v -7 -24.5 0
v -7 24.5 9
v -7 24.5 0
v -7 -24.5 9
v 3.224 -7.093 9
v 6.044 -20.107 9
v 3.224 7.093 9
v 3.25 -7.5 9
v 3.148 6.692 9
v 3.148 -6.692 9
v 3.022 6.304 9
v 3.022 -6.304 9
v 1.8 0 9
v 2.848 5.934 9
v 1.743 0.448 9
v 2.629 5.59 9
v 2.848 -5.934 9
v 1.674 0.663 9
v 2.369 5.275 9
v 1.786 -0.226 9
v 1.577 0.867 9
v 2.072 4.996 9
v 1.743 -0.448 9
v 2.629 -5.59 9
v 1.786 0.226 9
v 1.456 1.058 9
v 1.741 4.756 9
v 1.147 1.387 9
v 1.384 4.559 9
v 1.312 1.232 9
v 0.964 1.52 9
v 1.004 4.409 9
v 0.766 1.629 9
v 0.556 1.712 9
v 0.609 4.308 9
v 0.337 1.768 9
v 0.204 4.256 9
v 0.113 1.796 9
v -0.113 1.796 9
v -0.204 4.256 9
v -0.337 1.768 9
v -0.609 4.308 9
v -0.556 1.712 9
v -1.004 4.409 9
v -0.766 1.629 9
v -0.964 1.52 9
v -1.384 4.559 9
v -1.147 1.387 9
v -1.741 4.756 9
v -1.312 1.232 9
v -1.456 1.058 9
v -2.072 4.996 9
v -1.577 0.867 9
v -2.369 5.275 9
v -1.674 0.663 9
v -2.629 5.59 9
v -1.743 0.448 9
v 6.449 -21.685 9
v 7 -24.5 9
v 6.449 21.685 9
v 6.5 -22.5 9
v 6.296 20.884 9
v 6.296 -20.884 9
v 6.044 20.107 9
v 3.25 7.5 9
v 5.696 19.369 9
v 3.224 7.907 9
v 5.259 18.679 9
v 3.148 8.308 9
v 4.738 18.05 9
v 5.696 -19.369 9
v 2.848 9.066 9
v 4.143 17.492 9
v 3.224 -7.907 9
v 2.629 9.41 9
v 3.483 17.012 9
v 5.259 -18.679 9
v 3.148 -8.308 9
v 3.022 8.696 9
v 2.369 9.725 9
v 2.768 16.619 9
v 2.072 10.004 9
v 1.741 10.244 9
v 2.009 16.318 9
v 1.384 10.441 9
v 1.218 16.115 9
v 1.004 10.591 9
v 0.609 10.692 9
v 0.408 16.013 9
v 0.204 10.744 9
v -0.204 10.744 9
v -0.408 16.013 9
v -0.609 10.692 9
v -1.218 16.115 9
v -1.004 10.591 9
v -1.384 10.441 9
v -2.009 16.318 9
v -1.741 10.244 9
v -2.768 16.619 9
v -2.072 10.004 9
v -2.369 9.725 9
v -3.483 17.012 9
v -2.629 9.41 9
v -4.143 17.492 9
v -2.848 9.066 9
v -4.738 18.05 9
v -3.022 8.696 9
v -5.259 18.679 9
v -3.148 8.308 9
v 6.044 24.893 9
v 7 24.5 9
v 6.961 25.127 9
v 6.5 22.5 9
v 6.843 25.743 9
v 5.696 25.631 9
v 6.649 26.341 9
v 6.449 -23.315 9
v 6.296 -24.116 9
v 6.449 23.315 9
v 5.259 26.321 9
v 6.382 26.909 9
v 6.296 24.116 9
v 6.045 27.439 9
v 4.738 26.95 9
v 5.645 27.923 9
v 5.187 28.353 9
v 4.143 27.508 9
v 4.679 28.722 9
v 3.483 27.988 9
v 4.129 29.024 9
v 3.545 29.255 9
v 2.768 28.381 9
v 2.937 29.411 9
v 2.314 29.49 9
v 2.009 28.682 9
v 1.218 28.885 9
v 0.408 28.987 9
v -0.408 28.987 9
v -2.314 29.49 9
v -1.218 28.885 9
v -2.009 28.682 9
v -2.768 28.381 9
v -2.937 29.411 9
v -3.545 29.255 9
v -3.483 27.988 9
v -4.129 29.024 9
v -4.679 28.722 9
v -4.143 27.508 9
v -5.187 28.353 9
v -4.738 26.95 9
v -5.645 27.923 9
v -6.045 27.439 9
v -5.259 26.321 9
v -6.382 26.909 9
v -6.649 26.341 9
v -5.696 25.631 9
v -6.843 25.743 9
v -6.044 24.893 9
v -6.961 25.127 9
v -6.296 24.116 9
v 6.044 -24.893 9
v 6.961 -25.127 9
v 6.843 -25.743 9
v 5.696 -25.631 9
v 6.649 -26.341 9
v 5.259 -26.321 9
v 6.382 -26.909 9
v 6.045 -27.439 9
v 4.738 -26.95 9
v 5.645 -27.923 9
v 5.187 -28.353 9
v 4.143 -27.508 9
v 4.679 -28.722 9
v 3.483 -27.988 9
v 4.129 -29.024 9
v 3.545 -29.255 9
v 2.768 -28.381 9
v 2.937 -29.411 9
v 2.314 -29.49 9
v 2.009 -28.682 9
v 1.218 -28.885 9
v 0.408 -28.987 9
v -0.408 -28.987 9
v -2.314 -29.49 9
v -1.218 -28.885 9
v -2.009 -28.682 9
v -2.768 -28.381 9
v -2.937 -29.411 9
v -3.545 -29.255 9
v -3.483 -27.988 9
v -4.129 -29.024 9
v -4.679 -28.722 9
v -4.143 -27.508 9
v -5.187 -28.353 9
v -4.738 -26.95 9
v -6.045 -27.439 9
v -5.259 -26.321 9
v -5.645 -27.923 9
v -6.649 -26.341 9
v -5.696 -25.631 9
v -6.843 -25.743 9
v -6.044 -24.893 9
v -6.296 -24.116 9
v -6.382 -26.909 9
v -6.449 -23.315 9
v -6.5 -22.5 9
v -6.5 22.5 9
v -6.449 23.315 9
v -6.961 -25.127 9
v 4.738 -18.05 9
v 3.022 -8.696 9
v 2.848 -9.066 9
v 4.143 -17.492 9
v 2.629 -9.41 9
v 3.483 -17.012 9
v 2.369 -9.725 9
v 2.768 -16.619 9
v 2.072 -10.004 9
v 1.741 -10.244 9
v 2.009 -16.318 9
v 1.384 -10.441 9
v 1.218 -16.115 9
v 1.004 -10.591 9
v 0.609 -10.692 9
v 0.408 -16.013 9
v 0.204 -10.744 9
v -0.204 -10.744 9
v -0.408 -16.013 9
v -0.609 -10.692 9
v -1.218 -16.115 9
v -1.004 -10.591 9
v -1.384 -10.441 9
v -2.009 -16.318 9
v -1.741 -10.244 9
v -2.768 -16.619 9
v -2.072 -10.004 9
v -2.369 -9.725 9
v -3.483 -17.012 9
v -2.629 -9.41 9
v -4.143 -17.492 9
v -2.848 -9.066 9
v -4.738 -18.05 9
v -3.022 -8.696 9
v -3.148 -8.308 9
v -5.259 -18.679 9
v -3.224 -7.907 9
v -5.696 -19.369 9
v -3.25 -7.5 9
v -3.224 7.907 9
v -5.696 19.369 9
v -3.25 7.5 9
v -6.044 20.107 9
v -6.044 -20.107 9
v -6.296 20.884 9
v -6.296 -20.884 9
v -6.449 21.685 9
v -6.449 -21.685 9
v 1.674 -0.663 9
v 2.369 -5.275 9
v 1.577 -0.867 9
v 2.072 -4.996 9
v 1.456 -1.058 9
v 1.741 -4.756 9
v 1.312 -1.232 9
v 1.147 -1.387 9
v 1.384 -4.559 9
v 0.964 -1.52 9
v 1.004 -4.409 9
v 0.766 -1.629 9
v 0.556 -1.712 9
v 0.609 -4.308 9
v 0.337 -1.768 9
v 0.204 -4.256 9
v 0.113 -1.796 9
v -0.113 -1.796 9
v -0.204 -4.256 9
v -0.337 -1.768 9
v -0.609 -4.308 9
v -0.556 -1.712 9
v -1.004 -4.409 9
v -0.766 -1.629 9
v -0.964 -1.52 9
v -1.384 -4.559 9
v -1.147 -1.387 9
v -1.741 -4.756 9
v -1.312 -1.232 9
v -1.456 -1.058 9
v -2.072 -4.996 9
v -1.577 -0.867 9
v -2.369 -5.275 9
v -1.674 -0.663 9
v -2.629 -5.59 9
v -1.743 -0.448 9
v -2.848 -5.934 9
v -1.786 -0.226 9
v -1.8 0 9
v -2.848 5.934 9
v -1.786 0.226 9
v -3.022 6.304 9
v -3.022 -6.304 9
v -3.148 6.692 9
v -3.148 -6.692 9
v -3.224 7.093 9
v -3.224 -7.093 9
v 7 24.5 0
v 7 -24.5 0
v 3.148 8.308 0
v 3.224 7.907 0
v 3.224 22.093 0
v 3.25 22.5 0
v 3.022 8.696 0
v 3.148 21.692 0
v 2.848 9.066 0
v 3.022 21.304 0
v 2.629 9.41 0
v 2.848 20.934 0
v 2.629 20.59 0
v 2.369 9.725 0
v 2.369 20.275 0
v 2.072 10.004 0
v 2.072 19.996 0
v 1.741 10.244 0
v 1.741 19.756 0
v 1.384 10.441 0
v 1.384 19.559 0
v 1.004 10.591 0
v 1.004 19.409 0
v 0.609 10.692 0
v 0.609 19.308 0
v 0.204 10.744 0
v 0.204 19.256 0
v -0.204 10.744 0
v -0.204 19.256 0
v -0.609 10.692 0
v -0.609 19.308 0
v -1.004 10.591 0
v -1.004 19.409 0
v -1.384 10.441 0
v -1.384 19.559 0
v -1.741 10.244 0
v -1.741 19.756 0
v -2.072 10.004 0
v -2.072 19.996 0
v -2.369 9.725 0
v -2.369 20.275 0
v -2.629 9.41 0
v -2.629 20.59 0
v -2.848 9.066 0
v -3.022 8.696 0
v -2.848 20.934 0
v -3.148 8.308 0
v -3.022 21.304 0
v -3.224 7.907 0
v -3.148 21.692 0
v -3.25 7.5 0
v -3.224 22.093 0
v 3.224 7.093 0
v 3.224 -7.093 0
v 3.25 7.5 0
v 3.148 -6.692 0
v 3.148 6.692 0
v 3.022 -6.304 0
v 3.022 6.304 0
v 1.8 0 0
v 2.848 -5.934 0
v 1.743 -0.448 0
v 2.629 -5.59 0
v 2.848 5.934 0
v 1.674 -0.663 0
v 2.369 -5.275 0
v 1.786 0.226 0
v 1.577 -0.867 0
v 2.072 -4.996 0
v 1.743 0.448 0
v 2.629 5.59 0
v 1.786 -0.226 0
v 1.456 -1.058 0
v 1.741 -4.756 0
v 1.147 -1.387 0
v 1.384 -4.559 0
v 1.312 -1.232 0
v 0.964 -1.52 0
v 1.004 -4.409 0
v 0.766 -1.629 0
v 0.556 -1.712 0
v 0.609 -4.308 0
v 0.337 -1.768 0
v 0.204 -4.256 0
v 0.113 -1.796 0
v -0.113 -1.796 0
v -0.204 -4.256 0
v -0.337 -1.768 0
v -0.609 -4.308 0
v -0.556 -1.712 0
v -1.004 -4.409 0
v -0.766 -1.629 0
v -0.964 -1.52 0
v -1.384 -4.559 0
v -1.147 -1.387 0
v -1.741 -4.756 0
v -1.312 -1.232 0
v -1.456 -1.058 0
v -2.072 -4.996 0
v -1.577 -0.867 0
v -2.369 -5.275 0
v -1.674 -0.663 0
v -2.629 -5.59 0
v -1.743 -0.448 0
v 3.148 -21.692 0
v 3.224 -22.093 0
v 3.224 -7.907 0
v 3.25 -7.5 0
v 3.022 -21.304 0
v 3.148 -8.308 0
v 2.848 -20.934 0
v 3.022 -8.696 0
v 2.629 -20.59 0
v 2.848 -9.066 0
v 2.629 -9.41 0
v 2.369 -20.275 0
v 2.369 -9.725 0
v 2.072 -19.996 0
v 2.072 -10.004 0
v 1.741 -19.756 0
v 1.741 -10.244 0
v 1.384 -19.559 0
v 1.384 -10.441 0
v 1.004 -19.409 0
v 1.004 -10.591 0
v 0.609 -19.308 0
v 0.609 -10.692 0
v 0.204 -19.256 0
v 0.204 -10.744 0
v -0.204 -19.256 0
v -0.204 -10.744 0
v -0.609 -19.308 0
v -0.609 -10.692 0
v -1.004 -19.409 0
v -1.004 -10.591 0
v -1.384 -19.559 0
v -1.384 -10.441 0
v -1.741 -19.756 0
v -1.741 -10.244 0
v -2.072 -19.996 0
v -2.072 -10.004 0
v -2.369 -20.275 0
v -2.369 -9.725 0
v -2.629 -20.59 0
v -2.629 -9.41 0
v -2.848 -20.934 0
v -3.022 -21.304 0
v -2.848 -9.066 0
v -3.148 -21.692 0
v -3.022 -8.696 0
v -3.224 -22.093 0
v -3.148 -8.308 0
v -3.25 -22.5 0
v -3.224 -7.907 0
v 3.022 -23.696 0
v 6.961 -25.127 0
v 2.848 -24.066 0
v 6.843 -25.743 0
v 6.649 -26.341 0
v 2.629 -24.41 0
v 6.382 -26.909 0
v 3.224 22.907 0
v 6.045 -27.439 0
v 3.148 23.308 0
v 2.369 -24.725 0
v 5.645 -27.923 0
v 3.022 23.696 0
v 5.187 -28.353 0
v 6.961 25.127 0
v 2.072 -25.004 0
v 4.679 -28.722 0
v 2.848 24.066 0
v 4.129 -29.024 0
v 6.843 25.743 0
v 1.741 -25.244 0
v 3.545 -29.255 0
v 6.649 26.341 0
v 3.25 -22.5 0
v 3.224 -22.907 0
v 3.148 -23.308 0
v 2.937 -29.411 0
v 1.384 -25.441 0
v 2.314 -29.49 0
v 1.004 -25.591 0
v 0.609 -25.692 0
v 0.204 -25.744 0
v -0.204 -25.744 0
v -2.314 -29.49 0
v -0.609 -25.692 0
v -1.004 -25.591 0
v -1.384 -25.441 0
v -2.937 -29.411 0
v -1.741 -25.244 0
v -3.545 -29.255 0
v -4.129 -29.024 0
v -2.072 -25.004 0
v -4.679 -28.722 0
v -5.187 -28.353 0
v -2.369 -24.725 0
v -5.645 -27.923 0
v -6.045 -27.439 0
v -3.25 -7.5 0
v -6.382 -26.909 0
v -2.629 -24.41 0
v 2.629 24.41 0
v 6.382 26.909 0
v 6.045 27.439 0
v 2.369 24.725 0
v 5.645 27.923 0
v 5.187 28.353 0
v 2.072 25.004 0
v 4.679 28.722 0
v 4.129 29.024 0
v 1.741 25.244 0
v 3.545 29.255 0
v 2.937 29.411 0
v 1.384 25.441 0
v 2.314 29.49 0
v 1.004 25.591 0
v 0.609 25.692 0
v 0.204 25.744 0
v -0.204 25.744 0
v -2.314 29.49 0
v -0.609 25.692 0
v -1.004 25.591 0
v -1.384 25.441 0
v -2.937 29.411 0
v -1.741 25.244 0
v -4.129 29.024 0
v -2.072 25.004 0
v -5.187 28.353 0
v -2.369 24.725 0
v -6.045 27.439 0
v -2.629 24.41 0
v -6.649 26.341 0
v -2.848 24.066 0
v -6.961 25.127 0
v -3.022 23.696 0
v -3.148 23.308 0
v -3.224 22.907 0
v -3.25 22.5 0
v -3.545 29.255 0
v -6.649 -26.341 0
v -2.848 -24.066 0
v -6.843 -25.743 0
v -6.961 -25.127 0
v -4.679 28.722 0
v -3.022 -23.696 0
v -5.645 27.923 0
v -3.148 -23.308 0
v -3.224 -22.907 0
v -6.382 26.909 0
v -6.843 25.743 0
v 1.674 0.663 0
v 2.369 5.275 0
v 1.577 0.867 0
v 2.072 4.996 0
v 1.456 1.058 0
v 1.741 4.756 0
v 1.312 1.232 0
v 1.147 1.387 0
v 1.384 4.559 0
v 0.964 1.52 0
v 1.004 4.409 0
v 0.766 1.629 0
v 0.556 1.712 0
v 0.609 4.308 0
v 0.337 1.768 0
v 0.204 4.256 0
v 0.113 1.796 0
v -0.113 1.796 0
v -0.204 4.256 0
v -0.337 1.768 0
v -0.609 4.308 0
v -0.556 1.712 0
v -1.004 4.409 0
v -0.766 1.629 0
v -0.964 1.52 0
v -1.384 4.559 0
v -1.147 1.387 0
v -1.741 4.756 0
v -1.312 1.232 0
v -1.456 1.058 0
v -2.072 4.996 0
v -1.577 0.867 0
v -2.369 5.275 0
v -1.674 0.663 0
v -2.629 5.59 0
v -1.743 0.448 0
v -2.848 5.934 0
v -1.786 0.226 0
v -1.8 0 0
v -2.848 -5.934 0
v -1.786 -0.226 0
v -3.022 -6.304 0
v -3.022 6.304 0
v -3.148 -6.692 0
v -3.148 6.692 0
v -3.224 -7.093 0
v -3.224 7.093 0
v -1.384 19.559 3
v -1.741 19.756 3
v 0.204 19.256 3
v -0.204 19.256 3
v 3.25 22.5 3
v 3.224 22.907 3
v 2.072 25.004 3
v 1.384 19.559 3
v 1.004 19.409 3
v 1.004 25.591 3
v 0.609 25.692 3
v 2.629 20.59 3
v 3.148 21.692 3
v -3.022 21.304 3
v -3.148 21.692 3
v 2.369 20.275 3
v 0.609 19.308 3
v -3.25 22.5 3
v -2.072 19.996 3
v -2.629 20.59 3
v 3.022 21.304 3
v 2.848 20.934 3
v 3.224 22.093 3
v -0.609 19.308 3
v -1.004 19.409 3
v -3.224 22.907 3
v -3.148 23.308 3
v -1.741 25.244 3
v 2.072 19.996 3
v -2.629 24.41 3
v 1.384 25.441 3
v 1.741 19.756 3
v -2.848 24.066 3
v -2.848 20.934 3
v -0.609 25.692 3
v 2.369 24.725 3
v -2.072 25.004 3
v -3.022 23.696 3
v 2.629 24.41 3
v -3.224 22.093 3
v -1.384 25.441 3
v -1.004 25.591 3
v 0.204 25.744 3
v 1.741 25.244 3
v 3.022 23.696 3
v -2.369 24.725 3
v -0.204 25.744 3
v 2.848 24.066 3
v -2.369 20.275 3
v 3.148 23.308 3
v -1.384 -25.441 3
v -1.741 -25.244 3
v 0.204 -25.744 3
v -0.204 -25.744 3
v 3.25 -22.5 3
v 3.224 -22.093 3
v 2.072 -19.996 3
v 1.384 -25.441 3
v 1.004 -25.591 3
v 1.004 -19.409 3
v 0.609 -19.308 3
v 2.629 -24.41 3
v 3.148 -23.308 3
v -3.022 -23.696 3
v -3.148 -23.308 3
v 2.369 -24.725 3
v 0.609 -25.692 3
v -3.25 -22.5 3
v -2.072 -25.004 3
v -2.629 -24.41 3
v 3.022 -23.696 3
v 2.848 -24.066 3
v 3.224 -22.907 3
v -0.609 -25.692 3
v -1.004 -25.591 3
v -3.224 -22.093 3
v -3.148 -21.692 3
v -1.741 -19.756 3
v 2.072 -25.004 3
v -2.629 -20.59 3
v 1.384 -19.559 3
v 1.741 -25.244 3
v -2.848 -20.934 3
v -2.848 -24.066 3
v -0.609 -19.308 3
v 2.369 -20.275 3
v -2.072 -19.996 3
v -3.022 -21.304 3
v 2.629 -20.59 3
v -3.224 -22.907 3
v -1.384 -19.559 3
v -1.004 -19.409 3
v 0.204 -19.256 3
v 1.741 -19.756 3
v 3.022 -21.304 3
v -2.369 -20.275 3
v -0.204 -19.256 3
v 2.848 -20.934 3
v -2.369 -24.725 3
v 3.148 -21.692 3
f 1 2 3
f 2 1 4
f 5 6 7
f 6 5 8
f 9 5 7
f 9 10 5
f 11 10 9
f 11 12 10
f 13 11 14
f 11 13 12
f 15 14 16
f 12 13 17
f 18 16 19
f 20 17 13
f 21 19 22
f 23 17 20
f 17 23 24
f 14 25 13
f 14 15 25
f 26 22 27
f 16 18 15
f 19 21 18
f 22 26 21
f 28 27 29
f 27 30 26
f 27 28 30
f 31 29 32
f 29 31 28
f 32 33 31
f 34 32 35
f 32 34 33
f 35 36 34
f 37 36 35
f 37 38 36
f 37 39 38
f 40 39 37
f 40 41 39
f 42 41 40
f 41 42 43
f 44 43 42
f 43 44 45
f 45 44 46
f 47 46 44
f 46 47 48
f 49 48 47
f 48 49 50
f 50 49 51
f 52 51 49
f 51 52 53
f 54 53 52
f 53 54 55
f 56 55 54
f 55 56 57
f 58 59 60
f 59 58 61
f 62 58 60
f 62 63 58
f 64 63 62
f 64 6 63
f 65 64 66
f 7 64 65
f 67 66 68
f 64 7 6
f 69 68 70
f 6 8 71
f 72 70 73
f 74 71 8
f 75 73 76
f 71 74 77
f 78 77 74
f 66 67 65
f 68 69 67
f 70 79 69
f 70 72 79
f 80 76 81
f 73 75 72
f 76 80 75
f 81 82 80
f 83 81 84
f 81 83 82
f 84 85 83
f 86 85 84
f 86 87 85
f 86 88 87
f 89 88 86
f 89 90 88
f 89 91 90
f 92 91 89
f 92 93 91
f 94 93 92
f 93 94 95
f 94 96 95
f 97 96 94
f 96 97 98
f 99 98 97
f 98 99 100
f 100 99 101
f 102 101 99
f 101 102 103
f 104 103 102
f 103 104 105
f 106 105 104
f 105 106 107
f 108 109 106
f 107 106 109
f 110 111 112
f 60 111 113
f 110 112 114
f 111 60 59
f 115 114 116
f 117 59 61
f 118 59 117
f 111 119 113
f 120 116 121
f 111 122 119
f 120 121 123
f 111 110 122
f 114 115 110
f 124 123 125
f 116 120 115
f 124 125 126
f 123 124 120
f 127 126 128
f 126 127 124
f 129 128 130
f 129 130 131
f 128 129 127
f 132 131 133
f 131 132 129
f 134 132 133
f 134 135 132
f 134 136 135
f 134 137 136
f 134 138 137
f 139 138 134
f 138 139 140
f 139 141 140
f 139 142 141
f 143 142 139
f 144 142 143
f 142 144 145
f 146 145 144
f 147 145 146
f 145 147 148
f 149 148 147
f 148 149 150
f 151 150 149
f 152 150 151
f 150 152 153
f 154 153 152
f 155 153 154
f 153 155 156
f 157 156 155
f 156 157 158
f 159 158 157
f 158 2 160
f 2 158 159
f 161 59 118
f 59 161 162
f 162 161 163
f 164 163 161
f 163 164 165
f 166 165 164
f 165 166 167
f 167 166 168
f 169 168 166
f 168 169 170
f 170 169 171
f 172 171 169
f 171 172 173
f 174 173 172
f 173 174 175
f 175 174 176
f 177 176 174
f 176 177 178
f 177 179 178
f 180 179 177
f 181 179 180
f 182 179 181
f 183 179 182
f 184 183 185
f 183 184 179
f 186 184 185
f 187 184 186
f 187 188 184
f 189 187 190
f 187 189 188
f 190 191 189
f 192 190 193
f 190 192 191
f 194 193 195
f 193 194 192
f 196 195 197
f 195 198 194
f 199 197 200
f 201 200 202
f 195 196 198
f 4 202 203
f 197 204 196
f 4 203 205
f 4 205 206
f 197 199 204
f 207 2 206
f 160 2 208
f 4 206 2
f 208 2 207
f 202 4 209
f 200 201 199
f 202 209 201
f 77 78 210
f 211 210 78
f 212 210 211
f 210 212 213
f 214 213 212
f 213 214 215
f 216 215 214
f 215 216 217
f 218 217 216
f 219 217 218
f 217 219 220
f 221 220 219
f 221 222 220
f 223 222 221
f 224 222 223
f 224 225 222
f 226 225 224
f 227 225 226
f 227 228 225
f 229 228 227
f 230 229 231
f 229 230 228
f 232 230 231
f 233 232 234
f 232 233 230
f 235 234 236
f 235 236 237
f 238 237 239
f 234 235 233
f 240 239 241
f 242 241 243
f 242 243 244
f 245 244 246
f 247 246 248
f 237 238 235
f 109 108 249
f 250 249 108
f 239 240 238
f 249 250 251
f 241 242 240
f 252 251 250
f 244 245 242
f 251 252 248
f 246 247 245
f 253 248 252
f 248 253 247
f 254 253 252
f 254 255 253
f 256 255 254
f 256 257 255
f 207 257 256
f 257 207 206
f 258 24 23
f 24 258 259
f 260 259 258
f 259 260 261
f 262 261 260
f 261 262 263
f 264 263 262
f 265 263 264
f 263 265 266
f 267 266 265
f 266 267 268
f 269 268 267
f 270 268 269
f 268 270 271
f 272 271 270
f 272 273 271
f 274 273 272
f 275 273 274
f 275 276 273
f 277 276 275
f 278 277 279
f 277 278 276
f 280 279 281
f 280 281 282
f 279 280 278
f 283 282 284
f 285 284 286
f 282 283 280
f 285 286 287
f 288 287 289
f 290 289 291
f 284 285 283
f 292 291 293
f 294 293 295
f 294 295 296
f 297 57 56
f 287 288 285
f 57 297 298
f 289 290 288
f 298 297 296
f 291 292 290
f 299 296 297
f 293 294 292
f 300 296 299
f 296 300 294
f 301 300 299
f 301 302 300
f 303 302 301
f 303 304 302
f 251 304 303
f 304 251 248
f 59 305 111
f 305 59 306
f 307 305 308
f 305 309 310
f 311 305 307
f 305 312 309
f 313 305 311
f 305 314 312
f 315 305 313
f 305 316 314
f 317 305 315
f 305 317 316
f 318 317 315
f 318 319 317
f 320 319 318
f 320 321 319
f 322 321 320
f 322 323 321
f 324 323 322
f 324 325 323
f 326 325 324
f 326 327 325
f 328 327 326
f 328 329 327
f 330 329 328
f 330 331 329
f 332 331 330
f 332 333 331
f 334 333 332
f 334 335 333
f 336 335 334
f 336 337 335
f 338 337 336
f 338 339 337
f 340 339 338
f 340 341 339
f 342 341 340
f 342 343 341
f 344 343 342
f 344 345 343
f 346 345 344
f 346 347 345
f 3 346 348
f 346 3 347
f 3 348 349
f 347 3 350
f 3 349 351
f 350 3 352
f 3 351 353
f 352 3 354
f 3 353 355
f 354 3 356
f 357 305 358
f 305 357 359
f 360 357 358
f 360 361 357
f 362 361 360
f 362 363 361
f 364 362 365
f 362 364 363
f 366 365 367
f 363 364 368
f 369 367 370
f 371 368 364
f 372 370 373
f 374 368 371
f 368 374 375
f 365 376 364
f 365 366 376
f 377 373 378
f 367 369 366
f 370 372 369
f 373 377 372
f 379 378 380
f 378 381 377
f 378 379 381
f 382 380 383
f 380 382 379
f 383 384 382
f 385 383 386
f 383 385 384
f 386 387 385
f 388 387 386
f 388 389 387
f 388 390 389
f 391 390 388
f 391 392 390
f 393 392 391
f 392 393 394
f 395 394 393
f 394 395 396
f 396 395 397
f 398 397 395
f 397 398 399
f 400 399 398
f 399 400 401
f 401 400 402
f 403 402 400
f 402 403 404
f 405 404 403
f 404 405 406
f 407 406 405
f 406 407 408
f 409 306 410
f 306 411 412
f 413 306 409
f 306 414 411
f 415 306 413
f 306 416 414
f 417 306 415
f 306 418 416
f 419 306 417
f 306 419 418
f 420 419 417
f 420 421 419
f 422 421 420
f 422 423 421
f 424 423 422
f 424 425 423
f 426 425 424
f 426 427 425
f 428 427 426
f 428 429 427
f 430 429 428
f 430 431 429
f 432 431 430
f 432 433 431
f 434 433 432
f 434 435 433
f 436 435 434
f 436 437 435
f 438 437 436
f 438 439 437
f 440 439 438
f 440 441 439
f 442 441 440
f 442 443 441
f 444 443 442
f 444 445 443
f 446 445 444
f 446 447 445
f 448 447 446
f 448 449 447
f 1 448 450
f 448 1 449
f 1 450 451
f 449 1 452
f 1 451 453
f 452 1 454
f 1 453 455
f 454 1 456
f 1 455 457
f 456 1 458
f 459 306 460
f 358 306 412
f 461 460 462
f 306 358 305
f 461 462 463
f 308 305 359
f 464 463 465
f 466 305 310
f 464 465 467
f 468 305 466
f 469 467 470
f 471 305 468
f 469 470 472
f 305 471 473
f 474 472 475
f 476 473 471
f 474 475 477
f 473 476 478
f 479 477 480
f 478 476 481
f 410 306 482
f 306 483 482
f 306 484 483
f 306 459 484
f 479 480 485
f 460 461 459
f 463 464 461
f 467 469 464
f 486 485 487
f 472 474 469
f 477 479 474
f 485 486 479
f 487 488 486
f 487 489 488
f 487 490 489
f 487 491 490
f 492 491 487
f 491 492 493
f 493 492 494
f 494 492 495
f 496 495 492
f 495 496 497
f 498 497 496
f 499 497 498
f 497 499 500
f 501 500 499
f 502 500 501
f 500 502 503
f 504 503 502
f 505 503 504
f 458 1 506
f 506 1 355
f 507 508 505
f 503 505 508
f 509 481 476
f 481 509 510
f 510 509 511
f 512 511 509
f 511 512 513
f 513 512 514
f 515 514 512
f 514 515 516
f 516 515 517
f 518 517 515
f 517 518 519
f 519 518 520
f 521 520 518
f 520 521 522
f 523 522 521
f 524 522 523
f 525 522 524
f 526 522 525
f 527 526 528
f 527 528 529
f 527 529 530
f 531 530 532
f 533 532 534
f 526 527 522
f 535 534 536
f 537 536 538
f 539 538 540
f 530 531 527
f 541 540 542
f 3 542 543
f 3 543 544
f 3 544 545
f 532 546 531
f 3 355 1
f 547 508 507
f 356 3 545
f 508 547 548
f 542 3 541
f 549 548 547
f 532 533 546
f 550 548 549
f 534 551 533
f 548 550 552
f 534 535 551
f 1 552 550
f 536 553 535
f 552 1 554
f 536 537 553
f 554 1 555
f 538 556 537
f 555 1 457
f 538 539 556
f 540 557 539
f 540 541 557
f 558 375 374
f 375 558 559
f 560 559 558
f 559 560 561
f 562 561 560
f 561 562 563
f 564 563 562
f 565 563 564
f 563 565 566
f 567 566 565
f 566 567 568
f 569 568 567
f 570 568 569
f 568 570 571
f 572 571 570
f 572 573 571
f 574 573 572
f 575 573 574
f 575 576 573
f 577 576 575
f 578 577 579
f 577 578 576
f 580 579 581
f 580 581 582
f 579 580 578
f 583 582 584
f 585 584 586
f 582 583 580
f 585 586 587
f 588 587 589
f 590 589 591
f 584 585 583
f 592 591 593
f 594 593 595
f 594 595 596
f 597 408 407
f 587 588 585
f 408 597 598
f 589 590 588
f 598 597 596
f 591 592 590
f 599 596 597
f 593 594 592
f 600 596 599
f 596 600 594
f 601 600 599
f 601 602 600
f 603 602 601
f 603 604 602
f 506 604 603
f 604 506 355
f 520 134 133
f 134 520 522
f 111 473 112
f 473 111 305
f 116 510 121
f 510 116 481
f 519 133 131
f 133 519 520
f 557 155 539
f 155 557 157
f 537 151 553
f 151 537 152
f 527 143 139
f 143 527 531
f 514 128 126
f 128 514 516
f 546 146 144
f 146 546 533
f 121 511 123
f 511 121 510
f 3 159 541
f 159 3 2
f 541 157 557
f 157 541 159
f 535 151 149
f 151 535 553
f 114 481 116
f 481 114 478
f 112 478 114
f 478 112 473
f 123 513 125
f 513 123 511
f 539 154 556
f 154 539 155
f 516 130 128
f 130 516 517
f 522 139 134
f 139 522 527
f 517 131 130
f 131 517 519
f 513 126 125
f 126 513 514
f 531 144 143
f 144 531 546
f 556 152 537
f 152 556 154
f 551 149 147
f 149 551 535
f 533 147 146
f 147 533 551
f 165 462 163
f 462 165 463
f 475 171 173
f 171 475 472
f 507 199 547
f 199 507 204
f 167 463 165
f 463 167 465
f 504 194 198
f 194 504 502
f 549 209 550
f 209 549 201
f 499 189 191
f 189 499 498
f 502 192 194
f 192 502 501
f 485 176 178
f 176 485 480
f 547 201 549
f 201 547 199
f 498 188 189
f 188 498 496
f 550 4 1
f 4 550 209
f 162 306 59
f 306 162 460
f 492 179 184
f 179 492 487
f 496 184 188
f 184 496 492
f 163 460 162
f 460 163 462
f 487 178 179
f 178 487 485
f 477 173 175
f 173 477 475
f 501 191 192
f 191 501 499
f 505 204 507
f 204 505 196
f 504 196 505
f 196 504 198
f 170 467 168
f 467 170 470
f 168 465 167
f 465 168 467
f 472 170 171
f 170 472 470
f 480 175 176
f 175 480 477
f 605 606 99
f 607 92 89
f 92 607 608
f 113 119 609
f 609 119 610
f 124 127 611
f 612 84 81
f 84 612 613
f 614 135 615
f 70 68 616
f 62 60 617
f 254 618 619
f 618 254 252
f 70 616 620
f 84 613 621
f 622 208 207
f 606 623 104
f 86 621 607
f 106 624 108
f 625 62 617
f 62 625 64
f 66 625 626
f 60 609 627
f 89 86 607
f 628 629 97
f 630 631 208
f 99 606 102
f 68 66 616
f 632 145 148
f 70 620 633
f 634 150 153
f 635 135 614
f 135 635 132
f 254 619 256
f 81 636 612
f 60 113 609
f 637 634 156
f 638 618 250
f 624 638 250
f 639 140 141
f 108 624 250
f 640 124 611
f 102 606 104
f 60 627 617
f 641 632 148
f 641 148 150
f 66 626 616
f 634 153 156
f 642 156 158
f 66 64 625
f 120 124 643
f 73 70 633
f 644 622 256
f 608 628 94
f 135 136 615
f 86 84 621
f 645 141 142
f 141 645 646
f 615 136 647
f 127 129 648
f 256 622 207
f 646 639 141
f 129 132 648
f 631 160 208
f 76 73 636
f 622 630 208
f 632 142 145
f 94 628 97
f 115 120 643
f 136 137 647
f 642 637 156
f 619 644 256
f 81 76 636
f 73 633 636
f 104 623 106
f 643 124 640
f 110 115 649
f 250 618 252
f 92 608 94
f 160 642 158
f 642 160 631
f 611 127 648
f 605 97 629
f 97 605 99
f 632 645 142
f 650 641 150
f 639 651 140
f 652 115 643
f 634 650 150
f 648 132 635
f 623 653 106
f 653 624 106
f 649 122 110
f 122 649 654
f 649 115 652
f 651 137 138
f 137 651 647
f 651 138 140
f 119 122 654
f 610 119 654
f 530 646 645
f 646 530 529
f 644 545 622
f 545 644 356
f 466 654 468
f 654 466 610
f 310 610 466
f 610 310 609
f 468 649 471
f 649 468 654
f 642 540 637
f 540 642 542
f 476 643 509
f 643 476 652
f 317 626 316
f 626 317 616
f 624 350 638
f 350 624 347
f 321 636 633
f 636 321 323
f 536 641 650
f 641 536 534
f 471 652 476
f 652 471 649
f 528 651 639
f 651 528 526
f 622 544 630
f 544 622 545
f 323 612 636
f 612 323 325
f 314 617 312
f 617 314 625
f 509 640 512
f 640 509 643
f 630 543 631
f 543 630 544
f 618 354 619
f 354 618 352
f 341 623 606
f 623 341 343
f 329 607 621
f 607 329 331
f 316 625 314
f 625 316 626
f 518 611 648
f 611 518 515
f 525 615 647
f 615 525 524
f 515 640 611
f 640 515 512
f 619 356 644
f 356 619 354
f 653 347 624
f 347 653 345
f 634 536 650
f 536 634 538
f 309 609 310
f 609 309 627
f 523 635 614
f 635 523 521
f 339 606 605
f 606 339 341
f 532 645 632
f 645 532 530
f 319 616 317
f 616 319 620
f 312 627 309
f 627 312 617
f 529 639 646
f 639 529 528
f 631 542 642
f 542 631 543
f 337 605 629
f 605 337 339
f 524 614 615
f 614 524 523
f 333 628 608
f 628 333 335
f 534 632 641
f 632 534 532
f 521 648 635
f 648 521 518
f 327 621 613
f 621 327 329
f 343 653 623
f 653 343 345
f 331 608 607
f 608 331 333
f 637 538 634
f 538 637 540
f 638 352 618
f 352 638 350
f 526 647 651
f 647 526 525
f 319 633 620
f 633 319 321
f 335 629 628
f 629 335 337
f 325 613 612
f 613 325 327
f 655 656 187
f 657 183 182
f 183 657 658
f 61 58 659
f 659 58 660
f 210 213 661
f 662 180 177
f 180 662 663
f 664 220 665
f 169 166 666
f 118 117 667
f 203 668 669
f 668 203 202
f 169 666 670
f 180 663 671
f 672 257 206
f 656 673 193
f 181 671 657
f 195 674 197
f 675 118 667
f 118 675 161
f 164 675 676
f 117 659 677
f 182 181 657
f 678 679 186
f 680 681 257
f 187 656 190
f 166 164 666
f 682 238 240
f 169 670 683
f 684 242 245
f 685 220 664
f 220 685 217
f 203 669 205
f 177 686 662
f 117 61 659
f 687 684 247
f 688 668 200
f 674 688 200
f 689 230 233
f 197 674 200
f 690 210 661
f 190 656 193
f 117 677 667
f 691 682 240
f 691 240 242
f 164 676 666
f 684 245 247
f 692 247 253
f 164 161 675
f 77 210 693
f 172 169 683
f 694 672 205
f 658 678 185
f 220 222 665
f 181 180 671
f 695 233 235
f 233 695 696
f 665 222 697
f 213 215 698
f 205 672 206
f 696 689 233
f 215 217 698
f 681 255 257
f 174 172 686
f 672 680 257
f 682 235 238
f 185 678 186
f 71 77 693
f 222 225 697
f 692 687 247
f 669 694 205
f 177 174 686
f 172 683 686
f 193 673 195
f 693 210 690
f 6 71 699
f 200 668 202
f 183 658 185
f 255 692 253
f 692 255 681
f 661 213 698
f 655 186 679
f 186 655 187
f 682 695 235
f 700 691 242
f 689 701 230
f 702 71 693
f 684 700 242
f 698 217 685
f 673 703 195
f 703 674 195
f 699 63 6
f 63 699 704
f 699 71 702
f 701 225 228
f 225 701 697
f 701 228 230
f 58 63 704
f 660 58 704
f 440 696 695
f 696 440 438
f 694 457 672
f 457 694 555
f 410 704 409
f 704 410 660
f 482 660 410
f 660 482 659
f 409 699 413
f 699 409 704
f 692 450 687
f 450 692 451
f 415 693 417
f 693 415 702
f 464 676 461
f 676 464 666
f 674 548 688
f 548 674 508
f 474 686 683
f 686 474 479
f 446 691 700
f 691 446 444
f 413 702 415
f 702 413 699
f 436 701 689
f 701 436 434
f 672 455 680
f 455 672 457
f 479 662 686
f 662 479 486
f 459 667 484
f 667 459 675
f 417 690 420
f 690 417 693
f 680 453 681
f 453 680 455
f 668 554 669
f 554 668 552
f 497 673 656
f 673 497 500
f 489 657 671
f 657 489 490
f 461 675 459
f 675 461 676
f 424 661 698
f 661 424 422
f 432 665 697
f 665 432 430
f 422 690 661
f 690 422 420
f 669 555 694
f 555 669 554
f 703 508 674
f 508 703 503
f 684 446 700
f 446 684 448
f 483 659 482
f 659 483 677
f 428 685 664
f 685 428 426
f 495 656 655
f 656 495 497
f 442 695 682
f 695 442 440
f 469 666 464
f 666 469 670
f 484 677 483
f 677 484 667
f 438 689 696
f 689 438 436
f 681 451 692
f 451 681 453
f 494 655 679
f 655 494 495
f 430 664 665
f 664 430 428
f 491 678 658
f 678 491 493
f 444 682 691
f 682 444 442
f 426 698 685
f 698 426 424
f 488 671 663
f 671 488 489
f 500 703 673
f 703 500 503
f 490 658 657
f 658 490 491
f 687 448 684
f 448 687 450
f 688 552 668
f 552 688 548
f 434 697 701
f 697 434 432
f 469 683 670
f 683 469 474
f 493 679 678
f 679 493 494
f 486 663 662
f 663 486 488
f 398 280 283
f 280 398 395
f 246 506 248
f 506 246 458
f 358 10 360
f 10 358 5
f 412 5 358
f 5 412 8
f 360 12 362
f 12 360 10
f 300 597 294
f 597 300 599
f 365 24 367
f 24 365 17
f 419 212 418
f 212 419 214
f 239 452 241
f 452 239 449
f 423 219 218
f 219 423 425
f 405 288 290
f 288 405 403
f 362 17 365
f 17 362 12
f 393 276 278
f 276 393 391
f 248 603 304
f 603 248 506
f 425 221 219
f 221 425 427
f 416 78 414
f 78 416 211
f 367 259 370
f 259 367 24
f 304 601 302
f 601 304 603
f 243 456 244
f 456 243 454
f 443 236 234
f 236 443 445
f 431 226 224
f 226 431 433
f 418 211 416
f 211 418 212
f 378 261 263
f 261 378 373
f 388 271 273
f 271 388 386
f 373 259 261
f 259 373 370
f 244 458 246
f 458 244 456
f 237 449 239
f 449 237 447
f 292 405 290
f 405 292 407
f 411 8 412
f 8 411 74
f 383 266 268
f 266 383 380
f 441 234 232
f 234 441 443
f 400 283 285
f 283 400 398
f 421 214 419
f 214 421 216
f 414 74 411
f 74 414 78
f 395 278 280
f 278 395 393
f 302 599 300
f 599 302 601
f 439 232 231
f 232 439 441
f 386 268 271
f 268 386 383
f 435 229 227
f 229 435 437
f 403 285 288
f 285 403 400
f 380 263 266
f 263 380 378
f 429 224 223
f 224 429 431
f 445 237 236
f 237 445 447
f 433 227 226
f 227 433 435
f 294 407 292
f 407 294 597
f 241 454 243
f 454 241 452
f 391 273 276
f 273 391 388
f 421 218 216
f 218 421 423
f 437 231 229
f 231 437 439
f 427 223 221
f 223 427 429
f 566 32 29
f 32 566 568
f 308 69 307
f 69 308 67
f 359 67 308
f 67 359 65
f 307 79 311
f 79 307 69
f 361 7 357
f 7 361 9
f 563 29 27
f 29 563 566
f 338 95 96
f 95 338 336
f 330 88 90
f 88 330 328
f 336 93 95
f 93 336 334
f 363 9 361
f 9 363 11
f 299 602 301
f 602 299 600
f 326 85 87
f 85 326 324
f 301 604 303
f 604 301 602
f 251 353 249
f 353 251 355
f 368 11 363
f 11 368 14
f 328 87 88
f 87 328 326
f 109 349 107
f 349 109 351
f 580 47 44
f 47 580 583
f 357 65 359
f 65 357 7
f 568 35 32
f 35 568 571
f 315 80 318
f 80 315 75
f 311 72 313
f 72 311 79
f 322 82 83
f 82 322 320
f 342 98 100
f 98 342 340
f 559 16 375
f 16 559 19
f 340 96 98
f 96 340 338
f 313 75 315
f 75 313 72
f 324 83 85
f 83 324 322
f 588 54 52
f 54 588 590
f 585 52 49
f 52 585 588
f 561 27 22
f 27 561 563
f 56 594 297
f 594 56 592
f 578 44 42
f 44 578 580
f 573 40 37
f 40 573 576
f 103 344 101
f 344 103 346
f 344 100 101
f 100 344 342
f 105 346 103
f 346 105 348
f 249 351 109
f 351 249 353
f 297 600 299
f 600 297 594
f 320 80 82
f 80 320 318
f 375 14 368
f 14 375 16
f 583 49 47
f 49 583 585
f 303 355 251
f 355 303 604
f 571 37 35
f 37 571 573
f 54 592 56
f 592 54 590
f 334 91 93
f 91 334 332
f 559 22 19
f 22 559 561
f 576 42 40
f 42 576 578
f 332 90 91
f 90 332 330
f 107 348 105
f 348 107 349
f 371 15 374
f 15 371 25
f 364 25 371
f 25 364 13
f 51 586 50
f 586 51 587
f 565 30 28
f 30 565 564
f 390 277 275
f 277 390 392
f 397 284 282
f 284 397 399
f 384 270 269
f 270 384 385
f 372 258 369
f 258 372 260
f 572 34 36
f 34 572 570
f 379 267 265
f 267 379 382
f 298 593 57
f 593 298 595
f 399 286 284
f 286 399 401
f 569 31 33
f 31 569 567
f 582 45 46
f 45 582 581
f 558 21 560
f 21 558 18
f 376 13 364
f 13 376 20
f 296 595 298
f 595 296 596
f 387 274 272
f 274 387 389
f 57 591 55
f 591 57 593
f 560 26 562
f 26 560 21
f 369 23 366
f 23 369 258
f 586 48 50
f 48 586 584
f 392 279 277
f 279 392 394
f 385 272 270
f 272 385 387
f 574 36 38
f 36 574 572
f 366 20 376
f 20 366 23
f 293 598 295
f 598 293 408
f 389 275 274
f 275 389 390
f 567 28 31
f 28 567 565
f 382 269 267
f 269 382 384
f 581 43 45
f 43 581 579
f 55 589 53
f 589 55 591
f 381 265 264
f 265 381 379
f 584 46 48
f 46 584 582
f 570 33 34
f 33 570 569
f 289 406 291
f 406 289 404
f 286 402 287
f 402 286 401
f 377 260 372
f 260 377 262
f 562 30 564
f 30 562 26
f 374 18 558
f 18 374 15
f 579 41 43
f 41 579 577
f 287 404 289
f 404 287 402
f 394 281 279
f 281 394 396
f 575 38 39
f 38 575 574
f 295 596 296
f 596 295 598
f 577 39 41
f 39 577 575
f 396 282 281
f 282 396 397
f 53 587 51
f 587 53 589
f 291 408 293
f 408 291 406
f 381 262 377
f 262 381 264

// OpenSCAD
$fn = 50;


difference() {
	union() {
		hull() {
			translate(v = [-2.0000000000, 9.5000000000, 0]) {
				cylinder(h = 9, r = 5);
			}
			translate(v = [2.0000000000, 9.5000000000, 0]) {
				cylinder(h = 9, r = 5);
			}
			translate(v = [-2.0000000000, -9.5000000000, 0]) {
				cylinder(h = 9, r = 5);
			}
			translate(v = [2.0000000000, -9.5000000000, 0]) {
				cylinder(h = 9, r = 5);
			}
		}
		translate(v = [0.0000000000, 15.0000000000, 0]) {
			hull() {
				translate(v = [-2.0000000000, 9.5000000000, 0]) {
					cylinder(h = 9, r = 5);
				}
				translate(v = [2.0000000000, 9.5000000000, 0]) {
					cylinder(h = 9, r = 5);
				}
				translate(v = [-2.0000000000, -9.5000000000, 0]) {
					cylinder(h = 9, r = 5);
				}
				translate(v = [2.0000000000, -9.5000000000, 0]) {
					cylinder(h = 9, r = 5);
				}
			}
		}
		translate(v = [0.0000000000, 15.0000000000, 0]) {
			hull() {
				translate(v = [-2.0000000000, 9.5000000000, 0]) {
					cylinder(h = 9, r = 5);
				}
				translate(v = [2.0000000000, 9.5000000000, 0]) {
					cylinder(h = 9, r = 5);
				}
				translate(v = [-2.0000000000, -9.5000000000, 0]) {
					cylinder(h = 9, r = 5);
				}
				translate(v = [2.0000000000, -9.5000000000, 0]) {
					cylinder(h = 9, r = 5);
				}
			}
		}
		translate(v = [0.0000000000, -15.0000000000, 0]) {
			hull() {
				translate(v = [-2.0000000000, 9.5000000000, 0]) {
					cylinder(h = 9, r = 5);
				}
				translate(v = [2.0000000000, 9.5000000000, 0]) {
					cylinder(h = 9, r = 5);
				}
				translate(v = [-2.0000000000, -9.5000000000, 0]) {
					cylinder(h = 9, r = 5);
				}
				translate(v = [2.0000000000, -9.5000000000, 0]) {
					cylinder(h = 9, r = 5);
				}
			}
		}
		translate(v = [0.0000000000, -15.0000000000, 0]) {
			hull() {
				translate(v = [-2.0000000000, 9.5000000000, 0]) {
					cylinder(h = 9, r = 5);
				}
				translate(v = [2.0000000000, 9.5000000000, 0]) {
					cylinder(h = 9, r = 5);
				}
				translate(v = [-2.0000000000, -9.5000000000, 0]) {
					cylinder(h = 9, r = 5);
				}
				translate(v = [2.0000000000, -9.5000000000, 0]) {
					cylinder(h = 9, r = 5);
				}
			}
		}
	}
	union() {
		translate(v = [0.0000000000, 22.5000000000, 9]) {
			rotate(a = [0, 0, 0]) {
				difference() {
					union() {
						#translate(v = [0, 0, -9.0000000000]) {
							cylinder(h = 9, r = 2.2500000000);
						}
						#translate(v = [0, 0, -6]) {
							cylinder(h = 6, r1 = 3.2500000000, r2 = 6.5000000000);
						}
						#translate(v = [0, 0, -9.0000000000]) {
							cylinder(h = 9, r = 3.2500000000);
						}
						#translate(v = [0, 0, -9.0000000000]) {
							cylinder(h = 9, r = 2.2500000000);
						}
					}
					union();
				}
			}
		}
		translate(v = [0.0000000000, 22.5000000000, 9]) {
			rotate(a = [0, 0, 0]) {
				difference() {
					union() {
						#translate(v = [0, 0, -9.0000000000]) {
							cylinder(h = 9, r = 2.2500000000);
						}
						#translate(v = [0, 0, -6]) {
							cylinder(h = 6, r1 = 3.2500000000, r2 = 6.5000000000);
						}
						#translate(v = [0, 0, -9.0000000000]) {
							cylinder(h = 9, r = 3.2500000000);
						}
						#translate(v = [0, 0, -9.0000000000]) {
							cylinder(h = 9, r = 2.2500000000);
						}
					}
					union();
				}
			}
		}
		translate(v = [0.0000000000, -22.5000000000, 9]) {
			rotate(a = [0, 0, 0]) {
				difference() {
					union() {
						#translate(v = [0, 0, -9.0000000000]) {
							cylinder(h = 9, r = 2.2500000000);
						}
						#translate(v = [0, 0, -6]) {
							cylinder(h = 6, r1 = 3.2500000000, r2 = 6.5000000000);
						}
						#translate(v = [0, 0, -9.0000000000]) {
							cylinder(h = 9, r = 3.2500000000);
						}
						#translate(v = [0, 0, -9.0000000000]) {
							cylinder(h = 9, r = 2.2500000000);
						}
					}
					union();
				}
			}
		}
		translate(v = [0.0000000000, -22.5000000000, 9]) {
			rotate(a = [0, 0, 0]) {
				difference() {
					union() {
						#translate(v = [0, 0, -9.0000000000]) {
							cylinder(h = 9, r = 2.2500000000);
						}
						#translate(v = [0, 0, -6]) {
							cylinder(h = 6, r1 = 3.2500000000, r2 = 6.5000000000);
						}
						#translate(v = [0, 0, -9.0000000000]) {
							cylinder(h = 9, r = 3.2500000000);
						}
						#translate(v = [0, 0, -9.0000000000]) {
							cylinder(h = 9, r = 2.2500000000);
						}
					}
					union();
				}
			}
		}
		translate(v = [0.0000000000, -7.5000000000, 0]) {
			translate(v = [0, 0, -100]) {
				cylinder(h = 200, r = 3.2500000000);
			}
		}
		translate(v = [0.0000000000, 7.5000000000, 0]) {
			translate(v = [0, 0, -100]) {
				cylinder(h = 200, r = 3.2500000000);
			}
		}
		translate(v = [0.0000000000, -7.5000000000, 0]) {
			translate(v = [0, 0, -100]) {
				cylinder(h = 200, r = 1.8000000000);
			}
		}
		translate(v = [0, 0, -100]) {
			cylinder(h = 200, r = 1.8000000000);
		}
		translate(v = [0.0000000000, 7.5000000000, 0]) {
			translate(v = [0, 0, -100]) {
				cylinder(h = 200, r = 1.8000000000);
			}
		}
	}
}
